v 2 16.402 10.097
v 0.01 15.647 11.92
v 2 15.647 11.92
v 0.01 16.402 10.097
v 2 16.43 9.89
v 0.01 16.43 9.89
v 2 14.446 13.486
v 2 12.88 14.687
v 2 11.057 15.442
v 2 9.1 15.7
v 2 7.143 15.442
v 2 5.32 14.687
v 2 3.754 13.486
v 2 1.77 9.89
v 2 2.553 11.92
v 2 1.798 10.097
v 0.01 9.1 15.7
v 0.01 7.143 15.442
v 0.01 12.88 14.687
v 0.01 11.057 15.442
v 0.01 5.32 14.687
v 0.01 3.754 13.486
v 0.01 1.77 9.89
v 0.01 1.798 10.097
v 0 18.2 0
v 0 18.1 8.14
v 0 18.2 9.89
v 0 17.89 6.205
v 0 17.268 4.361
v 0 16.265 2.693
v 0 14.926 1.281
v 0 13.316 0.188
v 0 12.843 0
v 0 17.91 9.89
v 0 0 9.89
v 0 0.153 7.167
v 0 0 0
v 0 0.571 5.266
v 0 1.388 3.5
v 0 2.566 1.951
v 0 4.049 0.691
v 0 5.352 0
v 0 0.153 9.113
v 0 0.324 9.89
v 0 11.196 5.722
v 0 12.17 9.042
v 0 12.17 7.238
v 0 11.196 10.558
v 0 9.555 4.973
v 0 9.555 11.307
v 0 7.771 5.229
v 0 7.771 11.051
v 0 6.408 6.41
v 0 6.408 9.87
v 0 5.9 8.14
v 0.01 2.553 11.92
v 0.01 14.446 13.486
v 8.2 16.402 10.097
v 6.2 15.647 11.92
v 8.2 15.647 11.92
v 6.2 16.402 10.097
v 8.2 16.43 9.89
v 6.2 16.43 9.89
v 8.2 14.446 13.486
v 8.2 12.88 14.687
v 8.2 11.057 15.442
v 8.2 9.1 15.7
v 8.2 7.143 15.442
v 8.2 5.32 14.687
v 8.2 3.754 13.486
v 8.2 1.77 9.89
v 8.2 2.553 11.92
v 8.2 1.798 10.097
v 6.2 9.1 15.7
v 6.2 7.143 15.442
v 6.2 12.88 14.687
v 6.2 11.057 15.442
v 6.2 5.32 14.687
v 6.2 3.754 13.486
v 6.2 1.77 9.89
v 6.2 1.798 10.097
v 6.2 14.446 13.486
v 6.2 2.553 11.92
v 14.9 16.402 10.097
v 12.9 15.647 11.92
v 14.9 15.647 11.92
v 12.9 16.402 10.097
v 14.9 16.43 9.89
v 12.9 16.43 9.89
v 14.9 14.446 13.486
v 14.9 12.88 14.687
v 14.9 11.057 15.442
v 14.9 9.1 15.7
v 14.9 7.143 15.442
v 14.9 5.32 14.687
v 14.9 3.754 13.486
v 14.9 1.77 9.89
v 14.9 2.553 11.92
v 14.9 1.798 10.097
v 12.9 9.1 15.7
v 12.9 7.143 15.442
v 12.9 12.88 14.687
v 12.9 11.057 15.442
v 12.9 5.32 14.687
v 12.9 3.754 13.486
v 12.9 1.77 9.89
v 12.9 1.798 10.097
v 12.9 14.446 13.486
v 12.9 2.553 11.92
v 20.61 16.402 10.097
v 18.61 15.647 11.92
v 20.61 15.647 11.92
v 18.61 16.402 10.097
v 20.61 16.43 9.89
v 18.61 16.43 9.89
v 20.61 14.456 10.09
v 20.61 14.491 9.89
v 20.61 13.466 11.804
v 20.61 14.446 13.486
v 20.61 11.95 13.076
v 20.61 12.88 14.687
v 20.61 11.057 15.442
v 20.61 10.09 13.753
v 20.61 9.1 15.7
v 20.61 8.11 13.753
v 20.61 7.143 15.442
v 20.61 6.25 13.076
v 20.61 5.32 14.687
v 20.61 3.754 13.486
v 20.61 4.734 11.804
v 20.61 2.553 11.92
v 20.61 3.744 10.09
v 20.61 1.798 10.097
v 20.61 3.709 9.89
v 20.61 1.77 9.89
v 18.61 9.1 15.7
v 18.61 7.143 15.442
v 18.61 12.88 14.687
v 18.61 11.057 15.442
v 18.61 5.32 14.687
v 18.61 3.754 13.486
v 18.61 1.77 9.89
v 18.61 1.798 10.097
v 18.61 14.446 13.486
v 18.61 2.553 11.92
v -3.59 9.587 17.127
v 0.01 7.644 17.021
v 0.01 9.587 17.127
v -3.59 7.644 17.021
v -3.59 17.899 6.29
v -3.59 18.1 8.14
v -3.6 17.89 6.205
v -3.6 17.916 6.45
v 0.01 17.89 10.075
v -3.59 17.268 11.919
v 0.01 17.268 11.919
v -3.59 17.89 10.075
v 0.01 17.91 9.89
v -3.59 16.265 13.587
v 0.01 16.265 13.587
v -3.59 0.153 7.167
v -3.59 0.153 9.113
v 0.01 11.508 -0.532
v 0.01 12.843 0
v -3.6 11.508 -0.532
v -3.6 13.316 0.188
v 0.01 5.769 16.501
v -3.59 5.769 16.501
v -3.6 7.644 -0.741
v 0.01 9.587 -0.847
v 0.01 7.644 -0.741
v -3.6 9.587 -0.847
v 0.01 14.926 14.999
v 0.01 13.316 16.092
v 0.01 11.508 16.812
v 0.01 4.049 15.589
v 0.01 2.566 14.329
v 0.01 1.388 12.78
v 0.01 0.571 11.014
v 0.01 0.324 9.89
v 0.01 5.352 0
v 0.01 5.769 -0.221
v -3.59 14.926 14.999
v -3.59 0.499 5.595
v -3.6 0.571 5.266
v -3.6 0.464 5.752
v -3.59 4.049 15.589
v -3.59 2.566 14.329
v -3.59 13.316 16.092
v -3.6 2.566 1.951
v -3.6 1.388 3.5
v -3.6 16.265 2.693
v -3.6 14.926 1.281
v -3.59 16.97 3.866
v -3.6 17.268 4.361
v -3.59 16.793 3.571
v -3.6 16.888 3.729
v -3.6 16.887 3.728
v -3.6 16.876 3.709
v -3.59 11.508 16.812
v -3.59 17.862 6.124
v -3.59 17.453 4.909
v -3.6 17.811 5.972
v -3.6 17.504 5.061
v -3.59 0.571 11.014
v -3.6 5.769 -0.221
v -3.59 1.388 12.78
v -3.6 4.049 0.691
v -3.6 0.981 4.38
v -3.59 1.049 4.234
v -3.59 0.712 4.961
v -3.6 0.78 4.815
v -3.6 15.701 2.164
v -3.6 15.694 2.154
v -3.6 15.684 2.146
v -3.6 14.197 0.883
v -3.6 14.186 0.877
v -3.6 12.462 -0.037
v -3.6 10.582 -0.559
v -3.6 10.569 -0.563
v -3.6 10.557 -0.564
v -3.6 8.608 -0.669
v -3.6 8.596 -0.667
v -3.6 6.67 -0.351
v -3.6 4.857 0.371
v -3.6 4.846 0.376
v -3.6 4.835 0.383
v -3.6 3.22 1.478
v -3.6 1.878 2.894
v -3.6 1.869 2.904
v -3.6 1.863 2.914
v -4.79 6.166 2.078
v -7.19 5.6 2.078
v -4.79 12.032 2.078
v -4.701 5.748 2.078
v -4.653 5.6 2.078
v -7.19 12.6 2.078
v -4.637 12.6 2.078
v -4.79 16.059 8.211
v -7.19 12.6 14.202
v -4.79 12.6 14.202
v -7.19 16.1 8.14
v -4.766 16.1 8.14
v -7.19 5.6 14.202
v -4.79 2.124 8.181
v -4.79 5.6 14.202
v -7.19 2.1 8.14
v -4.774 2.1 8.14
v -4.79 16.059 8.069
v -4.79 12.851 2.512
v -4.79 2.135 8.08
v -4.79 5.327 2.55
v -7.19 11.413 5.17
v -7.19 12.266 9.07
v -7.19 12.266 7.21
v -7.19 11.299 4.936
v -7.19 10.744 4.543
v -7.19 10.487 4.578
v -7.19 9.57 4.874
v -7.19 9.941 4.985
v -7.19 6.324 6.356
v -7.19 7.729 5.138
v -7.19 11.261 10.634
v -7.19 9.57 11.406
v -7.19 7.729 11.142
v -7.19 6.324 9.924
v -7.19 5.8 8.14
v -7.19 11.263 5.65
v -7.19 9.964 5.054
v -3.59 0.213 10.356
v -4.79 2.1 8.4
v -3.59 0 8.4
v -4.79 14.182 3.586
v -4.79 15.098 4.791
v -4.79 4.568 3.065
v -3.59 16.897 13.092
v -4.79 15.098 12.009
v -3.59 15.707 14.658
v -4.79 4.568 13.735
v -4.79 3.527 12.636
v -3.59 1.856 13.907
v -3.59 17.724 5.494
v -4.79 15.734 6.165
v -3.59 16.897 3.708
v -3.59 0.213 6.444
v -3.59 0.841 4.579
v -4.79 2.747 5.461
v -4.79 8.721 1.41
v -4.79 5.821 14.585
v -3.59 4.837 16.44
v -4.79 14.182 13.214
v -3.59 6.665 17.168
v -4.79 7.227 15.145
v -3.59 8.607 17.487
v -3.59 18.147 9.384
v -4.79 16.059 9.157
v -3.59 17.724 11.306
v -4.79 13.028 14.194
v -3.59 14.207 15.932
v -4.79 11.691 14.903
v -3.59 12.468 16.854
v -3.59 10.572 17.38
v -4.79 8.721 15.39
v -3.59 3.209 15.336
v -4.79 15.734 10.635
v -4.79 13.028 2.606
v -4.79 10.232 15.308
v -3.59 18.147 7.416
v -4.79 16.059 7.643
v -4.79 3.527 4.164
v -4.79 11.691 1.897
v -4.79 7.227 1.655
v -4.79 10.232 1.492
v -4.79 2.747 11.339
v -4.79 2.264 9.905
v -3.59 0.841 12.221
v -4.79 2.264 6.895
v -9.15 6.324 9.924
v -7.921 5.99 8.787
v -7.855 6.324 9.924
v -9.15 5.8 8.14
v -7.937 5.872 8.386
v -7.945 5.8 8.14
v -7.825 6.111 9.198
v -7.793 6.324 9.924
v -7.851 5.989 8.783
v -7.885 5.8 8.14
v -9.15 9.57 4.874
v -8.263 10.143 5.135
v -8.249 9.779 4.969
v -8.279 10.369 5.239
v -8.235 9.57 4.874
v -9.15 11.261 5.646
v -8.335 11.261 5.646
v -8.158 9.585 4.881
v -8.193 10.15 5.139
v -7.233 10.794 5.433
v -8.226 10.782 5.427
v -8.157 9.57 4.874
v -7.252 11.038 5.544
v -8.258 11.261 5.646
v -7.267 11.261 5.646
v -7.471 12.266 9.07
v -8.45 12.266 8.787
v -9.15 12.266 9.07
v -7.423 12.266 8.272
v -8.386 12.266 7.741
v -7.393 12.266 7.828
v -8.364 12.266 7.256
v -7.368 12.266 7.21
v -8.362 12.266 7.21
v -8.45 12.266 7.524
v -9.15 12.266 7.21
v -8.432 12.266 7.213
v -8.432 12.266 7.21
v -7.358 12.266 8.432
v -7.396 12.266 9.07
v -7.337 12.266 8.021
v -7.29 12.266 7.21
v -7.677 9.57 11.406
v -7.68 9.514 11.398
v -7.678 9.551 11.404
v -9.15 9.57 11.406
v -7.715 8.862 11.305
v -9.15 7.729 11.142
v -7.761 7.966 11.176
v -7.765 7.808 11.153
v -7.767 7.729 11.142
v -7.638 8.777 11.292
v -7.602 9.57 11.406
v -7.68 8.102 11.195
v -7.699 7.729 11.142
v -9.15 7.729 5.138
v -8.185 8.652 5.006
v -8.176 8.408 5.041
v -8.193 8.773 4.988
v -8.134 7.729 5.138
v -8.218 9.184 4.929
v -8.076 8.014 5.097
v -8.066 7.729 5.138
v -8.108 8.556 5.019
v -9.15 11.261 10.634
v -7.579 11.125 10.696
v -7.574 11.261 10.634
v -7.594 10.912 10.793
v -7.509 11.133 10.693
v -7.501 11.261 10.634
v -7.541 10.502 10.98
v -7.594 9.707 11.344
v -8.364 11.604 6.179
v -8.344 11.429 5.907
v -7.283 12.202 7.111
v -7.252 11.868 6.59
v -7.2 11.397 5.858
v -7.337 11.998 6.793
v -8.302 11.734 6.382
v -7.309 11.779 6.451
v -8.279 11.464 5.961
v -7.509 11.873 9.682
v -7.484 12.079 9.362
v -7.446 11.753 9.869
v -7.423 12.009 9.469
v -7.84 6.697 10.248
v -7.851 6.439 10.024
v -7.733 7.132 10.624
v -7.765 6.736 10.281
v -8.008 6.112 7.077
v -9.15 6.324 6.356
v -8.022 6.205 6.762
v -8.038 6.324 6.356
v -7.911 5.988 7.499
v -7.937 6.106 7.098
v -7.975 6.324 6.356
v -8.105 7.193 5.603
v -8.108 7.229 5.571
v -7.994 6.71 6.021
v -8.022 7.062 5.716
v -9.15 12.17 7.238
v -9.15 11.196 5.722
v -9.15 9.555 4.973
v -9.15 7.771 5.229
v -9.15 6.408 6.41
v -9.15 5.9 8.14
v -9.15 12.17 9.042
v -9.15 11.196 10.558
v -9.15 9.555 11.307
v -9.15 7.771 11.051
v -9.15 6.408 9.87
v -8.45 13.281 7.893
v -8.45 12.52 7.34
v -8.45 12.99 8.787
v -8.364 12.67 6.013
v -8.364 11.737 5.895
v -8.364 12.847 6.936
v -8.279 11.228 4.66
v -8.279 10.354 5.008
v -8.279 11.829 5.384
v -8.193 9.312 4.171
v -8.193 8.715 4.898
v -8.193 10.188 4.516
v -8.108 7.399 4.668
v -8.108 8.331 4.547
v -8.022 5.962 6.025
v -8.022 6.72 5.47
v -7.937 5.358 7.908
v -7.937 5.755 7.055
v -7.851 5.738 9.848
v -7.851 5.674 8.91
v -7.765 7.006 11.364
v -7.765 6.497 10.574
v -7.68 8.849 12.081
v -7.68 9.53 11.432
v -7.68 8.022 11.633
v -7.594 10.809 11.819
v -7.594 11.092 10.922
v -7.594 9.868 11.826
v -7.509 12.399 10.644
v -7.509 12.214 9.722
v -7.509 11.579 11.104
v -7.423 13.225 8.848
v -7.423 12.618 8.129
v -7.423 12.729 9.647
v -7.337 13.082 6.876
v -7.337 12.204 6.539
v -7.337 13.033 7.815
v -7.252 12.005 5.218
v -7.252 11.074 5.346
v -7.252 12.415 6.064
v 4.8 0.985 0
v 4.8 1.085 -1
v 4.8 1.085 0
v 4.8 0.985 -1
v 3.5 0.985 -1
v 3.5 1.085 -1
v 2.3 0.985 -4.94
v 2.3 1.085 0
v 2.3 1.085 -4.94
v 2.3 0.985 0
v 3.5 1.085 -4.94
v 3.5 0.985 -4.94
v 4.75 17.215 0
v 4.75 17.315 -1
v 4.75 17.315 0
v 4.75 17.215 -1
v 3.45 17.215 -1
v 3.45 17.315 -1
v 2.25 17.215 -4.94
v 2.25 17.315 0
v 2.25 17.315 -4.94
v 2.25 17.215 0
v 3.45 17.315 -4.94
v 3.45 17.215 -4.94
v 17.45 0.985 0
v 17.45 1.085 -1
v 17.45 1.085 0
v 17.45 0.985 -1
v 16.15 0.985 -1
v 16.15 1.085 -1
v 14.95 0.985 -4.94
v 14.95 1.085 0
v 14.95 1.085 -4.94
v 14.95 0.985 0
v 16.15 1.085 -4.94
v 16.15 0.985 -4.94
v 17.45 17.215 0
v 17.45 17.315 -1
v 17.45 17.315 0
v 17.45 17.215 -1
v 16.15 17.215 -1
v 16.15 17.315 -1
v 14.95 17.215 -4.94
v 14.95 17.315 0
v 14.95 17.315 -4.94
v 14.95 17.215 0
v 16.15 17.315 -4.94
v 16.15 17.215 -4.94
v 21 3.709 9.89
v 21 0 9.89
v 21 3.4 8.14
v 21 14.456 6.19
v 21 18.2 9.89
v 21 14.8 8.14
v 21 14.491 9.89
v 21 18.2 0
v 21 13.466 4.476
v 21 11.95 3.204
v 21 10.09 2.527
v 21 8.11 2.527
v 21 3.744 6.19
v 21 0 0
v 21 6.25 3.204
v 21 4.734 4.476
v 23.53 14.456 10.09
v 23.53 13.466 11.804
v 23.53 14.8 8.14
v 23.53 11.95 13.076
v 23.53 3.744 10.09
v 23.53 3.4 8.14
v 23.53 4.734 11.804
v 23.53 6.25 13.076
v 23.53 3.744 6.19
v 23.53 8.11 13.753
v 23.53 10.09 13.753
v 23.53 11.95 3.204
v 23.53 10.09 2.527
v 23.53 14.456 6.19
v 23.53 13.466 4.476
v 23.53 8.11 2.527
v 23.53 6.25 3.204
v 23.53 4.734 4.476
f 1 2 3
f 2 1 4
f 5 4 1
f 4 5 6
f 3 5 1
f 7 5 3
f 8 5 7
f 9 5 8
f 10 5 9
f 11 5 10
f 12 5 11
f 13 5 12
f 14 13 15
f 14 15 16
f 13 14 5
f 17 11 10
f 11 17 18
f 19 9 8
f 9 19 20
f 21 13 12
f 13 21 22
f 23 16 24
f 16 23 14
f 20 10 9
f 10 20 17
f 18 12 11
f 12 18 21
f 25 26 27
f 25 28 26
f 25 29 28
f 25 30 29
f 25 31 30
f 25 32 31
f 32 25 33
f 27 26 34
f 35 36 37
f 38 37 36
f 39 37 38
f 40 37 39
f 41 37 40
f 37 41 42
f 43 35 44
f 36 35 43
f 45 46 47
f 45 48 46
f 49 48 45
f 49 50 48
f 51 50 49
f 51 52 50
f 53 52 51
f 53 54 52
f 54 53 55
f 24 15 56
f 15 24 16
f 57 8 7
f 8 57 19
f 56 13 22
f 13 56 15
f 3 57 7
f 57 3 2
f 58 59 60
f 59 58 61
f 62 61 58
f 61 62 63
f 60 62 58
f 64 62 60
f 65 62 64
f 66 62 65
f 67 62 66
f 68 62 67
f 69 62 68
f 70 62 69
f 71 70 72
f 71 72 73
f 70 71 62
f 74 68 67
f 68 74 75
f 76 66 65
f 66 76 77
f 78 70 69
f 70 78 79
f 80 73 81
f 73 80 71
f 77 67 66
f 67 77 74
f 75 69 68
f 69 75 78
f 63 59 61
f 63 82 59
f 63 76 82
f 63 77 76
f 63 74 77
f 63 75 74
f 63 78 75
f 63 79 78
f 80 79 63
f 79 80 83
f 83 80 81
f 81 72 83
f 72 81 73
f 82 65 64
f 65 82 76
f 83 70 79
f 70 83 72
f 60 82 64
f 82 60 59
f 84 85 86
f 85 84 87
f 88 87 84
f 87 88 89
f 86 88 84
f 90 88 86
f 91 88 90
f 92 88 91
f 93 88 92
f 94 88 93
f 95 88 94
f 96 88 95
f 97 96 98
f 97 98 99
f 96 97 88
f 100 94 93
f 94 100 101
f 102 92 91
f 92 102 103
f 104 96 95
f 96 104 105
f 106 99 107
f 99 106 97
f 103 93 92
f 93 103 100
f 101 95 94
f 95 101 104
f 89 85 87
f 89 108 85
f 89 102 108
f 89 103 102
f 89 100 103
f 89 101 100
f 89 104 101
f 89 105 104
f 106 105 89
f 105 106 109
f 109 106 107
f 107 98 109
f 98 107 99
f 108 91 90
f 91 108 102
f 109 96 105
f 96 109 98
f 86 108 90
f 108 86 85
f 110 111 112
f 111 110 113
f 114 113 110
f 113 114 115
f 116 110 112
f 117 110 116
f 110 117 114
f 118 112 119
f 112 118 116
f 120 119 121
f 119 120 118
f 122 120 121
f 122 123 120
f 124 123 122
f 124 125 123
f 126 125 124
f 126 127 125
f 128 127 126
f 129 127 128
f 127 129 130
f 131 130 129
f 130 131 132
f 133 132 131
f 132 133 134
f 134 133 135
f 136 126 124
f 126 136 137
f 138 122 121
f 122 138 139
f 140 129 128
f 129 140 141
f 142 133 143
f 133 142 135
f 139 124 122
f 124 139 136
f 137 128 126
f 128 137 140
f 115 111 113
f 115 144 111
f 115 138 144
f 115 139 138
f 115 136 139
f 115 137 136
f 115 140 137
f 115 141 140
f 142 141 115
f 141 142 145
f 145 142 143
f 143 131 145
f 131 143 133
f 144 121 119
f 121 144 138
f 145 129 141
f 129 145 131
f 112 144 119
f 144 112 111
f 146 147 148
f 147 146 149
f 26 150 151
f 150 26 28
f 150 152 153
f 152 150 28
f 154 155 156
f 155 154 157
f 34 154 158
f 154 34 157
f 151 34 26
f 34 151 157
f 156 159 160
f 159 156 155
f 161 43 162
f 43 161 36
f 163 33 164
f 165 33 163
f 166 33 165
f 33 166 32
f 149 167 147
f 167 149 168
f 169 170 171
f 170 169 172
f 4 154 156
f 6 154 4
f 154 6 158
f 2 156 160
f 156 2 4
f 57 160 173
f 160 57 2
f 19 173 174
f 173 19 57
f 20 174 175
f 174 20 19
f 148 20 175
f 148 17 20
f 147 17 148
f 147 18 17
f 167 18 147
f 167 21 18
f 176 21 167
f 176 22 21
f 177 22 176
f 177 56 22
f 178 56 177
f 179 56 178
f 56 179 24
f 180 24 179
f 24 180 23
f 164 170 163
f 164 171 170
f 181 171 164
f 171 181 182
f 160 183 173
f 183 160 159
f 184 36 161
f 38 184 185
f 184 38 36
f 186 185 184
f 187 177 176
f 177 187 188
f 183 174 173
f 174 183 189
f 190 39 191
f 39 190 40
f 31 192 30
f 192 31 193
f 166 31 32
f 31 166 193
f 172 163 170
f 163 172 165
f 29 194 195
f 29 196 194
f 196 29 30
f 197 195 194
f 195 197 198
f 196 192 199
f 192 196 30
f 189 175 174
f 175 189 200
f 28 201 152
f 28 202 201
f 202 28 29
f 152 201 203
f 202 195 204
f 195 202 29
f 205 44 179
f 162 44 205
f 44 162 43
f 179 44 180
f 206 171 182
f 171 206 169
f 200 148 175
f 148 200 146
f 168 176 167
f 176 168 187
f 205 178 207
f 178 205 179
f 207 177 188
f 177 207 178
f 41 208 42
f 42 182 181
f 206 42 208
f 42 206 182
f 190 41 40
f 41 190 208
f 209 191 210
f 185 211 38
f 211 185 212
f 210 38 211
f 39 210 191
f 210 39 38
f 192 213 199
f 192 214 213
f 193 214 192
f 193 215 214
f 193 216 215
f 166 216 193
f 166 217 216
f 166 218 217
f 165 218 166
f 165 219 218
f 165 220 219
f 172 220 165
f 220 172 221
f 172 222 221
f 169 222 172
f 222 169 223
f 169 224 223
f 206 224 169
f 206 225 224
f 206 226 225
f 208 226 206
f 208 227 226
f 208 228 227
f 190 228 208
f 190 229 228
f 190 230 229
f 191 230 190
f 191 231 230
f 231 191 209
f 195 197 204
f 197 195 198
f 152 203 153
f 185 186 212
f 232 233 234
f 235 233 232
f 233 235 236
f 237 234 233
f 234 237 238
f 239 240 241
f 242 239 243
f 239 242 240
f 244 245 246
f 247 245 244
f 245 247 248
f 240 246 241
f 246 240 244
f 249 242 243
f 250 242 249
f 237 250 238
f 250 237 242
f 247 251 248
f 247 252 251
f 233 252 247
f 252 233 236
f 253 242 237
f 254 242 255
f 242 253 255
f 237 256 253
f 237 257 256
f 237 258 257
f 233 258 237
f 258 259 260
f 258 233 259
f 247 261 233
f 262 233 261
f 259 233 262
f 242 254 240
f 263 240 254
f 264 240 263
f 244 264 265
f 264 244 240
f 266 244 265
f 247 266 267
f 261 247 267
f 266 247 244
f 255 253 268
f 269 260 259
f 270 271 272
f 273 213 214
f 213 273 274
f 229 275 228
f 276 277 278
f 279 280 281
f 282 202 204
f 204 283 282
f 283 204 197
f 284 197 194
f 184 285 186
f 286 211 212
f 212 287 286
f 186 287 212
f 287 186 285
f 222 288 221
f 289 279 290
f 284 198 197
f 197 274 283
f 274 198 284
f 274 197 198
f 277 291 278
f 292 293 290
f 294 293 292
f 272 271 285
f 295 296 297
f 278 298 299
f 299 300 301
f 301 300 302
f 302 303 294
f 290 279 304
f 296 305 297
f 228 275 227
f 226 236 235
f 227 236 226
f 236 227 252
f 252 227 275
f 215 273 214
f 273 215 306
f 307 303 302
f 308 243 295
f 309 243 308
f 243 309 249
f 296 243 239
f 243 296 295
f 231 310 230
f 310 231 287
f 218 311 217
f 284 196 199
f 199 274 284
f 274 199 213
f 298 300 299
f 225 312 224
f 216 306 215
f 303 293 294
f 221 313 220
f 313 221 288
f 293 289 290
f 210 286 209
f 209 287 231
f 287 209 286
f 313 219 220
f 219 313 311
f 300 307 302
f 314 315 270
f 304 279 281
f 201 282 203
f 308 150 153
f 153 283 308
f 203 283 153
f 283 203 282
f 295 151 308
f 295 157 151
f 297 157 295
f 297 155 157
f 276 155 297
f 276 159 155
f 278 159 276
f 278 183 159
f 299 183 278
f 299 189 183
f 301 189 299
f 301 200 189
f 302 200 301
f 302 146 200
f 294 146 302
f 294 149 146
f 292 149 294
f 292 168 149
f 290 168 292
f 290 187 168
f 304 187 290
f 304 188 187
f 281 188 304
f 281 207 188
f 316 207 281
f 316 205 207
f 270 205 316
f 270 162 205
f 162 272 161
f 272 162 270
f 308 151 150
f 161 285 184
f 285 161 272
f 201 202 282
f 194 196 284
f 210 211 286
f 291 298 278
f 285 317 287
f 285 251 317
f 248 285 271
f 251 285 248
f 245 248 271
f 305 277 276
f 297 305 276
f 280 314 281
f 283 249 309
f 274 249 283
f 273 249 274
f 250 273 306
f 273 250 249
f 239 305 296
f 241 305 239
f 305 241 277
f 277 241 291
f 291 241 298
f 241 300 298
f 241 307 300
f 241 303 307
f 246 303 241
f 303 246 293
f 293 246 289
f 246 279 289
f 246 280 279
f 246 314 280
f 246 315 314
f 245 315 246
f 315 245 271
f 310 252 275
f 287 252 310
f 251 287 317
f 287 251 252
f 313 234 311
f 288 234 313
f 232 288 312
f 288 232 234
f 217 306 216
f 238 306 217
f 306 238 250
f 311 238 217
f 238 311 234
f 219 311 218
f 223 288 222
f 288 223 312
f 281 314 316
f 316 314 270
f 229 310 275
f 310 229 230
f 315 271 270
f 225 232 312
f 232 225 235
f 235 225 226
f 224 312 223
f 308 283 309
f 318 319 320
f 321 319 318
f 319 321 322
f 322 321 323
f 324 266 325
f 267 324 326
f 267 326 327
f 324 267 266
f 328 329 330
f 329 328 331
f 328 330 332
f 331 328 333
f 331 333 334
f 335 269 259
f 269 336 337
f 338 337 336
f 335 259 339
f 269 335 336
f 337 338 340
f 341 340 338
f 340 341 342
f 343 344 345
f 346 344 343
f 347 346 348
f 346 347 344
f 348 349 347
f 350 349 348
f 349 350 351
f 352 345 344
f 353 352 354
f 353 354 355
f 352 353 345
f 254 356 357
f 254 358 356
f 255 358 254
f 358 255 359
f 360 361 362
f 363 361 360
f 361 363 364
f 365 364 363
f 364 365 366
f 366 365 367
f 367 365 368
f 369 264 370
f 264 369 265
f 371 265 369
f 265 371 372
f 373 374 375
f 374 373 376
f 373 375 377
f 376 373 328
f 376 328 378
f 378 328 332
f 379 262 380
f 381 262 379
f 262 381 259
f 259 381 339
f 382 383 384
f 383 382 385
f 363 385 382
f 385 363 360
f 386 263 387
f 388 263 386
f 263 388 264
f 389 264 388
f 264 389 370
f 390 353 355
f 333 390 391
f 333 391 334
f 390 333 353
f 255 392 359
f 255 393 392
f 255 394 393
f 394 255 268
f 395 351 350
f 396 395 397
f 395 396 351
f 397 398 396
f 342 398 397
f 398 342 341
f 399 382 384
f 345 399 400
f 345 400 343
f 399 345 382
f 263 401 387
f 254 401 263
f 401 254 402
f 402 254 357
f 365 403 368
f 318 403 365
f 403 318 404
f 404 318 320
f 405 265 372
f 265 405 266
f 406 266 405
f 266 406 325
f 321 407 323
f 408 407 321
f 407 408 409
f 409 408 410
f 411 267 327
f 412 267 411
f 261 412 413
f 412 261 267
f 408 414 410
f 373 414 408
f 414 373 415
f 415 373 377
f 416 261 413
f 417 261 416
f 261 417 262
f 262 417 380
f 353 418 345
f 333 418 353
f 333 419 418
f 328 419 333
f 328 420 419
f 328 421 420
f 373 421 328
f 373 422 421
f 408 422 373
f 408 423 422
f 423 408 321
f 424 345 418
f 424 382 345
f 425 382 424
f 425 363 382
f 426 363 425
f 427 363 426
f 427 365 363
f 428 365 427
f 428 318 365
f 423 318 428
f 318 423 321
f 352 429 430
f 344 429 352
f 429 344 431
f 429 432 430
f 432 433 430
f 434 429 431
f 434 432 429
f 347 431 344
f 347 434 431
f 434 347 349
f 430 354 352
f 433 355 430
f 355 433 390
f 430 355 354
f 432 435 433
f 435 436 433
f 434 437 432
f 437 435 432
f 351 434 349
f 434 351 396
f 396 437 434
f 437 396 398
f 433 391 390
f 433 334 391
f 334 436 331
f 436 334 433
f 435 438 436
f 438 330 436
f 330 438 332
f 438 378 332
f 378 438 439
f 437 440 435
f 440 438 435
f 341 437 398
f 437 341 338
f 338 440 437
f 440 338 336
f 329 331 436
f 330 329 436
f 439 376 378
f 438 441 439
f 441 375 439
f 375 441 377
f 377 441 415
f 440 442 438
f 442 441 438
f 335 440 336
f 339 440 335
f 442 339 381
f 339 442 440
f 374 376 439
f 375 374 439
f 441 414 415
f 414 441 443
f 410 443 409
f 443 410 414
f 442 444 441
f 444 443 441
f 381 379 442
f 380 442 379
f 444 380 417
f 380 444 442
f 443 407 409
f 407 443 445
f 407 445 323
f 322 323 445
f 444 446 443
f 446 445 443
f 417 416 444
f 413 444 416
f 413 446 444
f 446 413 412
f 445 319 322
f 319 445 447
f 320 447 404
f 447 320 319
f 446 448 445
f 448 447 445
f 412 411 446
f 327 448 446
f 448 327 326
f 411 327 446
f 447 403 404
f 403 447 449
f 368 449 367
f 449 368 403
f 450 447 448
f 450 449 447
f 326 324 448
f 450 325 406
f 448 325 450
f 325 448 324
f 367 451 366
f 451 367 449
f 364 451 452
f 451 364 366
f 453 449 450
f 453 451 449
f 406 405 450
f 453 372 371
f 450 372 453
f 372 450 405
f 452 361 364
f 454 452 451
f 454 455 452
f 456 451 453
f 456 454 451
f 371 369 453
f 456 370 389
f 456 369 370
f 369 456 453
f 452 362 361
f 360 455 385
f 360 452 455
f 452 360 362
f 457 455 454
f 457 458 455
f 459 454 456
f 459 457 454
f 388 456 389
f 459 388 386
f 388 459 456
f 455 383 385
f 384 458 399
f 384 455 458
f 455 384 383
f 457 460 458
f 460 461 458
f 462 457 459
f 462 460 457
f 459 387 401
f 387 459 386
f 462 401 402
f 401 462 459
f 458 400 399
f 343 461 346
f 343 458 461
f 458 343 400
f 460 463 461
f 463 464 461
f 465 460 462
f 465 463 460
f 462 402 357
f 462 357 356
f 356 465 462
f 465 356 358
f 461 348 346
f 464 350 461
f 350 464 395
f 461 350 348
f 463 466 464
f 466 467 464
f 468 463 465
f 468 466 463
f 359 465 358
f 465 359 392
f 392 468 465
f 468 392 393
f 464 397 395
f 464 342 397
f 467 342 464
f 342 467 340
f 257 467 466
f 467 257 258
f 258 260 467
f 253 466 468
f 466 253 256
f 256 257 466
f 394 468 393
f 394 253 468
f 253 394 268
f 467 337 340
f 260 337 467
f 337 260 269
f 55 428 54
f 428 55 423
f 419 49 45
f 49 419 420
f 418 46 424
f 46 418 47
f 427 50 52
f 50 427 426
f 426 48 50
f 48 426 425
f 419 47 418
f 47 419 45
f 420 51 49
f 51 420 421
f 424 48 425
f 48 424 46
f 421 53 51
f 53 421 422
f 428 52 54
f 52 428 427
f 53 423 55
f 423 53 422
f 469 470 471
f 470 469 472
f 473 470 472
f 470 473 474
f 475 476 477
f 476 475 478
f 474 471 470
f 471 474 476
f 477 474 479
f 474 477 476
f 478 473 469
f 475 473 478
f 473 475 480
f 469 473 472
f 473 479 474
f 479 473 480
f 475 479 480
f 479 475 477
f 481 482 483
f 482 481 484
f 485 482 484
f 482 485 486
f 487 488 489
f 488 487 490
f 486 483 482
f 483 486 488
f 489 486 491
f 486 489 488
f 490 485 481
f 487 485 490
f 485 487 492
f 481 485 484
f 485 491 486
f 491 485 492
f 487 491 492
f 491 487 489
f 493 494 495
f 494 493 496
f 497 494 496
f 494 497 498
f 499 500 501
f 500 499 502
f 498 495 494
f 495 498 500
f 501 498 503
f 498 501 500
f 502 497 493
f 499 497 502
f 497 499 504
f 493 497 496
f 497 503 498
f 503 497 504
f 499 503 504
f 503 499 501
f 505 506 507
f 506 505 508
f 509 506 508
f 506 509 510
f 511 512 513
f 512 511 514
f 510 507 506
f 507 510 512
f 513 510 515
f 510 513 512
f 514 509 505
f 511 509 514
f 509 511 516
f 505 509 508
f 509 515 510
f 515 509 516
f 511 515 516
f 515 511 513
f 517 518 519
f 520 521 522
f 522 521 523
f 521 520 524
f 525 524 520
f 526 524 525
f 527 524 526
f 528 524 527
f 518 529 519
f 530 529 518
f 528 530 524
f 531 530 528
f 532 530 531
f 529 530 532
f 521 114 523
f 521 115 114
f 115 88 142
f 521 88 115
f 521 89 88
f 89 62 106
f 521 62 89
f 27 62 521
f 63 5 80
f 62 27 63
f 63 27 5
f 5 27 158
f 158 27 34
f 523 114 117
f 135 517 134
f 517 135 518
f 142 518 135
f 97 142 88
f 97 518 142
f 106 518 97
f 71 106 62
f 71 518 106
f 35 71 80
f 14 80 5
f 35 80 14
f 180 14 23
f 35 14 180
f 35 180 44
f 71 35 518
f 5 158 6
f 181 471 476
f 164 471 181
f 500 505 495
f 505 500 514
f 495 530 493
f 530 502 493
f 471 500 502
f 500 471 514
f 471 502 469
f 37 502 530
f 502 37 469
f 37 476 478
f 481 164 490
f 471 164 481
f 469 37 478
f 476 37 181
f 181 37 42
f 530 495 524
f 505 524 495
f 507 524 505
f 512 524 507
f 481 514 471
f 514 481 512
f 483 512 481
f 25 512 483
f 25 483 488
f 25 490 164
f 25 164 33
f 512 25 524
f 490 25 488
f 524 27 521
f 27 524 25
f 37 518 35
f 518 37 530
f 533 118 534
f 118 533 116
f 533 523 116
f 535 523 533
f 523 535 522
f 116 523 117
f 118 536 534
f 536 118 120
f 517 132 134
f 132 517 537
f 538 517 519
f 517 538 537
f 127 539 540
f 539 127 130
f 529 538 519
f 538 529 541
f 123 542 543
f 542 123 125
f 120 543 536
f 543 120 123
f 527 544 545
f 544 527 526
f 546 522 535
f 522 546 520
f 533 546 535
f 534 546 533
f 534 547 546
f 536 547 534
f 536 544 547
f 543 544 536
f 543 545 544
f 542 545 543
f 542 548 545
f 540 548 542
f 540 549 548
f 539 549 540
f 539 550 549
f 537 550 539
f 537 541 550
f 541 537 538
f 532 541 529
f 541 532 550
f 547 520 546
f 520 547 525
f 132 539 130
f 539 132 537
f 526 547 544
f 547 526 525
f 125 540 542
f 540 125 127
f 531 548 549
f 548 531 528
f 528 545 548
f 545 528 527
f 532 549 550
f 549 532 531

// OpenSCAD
/* 2014 Don Bosley : 
Neutrik Jack Set V 0.0
For updates/corrections email : don@bosleymusic.com
Mechanical Drawing

Compatible with Neutrik products : 
- mono jack, switched, full threaded nose, offset PCB pins

NMJ4HFD3

*/

//MAIN BODY
translate([0,0,0])
color("black") 
cube([21,18.2,9.89]); 
 
//BODY SECTIONS
for (i = [ [0,9.1,8.14],
		   [6.2,9.1,8.14],
		   [12.9,9.1,8.14],
		   [18.61,9.1,8.14],
])
{
	color("black")
	translate(i)
	rotate([90,0,90])
	cylinder(r=15.7-8.14, h=2); 
}

//REAR CYLINDER
color("black")
translate([20.61,9.1,8.14])
rotate([90,0,90]) 
cylinder(r=5.7,h=23.53-20.61);


difference(){
	union(){
		//NUT
		color("lightgrey")
		translate([-3.59, 9.1,8.14])
		rotate([90,0,-90])
		cylinder(r=7,h=3.6, $fn=6); 
		
//FRONT WASHERS
		for ( i = [ [-1.2,9.1,8.14], 
					[-2.4,9.1,8.14], 
					[-3.6,9.1,8.14], 
		])
		{	
			color("black")
			translate(i)
			rotate([90,0,90])
			cylinder(r=9, h=1.21); 
		}
//FRONT BEVEL 
		color("black")
		translate([-3.59, 9.1,8.4])
		rotate([90,0,-90])
		cylinder(r2=7, r1=9.1,h=1.2);
//MAIN SHAFT 
		color("black")
		translate([-.15, 9.1,8.14])
		rotate([90,0,-90])
		cylinder(r=3.3,h=9); 
//FRONT SCREW THREAD
		color("black")
		translate([-4, 15.75-6.43, 8.14])
		rotate([0,90,0])
		linear_extrude(height = 8.9, center = true, convexity = 10, twist = 3000)
		translate([0, 3.2, 1])
		circle(r = .8); 
	}
//NUTHOLE
color("black")
translate([8, 9.1,8.14])
rotate([90,0,-90])
cylinder(r=3.2,h=24); 
}


/*ENSURE PIN CENTERS ARE ALIGNED (COMMENT OUT)
for (i = [  [2.9,2.23/2,-4],//S
		   [2.9,18.2-2.23/2,-4],//SN
		   [15.6,2.23/2,-4],//T
		   [15.6,18.2-2.23/2,-4],//TN

 ])
{
	translate(i)
	color("blue")
	cylinder(r=.65, h=9);
}
*/
//PINS 
for(i = [
	     [2.9-.6,.985,-1],//S
		 [2.9-.65,18.2-.985,-1],//SN
	     [15.6-.65,.985,-1],//T
		 [15.6-.65,18.2-.985,-1],//TN

])
{
	translate(i)
	color("lightgrey") 
	union(){
			cube([2.5,.1,9.1]);  
			translate([0,0,-3.94])
			cube([1.2,.1,3.96]);
	}
}
